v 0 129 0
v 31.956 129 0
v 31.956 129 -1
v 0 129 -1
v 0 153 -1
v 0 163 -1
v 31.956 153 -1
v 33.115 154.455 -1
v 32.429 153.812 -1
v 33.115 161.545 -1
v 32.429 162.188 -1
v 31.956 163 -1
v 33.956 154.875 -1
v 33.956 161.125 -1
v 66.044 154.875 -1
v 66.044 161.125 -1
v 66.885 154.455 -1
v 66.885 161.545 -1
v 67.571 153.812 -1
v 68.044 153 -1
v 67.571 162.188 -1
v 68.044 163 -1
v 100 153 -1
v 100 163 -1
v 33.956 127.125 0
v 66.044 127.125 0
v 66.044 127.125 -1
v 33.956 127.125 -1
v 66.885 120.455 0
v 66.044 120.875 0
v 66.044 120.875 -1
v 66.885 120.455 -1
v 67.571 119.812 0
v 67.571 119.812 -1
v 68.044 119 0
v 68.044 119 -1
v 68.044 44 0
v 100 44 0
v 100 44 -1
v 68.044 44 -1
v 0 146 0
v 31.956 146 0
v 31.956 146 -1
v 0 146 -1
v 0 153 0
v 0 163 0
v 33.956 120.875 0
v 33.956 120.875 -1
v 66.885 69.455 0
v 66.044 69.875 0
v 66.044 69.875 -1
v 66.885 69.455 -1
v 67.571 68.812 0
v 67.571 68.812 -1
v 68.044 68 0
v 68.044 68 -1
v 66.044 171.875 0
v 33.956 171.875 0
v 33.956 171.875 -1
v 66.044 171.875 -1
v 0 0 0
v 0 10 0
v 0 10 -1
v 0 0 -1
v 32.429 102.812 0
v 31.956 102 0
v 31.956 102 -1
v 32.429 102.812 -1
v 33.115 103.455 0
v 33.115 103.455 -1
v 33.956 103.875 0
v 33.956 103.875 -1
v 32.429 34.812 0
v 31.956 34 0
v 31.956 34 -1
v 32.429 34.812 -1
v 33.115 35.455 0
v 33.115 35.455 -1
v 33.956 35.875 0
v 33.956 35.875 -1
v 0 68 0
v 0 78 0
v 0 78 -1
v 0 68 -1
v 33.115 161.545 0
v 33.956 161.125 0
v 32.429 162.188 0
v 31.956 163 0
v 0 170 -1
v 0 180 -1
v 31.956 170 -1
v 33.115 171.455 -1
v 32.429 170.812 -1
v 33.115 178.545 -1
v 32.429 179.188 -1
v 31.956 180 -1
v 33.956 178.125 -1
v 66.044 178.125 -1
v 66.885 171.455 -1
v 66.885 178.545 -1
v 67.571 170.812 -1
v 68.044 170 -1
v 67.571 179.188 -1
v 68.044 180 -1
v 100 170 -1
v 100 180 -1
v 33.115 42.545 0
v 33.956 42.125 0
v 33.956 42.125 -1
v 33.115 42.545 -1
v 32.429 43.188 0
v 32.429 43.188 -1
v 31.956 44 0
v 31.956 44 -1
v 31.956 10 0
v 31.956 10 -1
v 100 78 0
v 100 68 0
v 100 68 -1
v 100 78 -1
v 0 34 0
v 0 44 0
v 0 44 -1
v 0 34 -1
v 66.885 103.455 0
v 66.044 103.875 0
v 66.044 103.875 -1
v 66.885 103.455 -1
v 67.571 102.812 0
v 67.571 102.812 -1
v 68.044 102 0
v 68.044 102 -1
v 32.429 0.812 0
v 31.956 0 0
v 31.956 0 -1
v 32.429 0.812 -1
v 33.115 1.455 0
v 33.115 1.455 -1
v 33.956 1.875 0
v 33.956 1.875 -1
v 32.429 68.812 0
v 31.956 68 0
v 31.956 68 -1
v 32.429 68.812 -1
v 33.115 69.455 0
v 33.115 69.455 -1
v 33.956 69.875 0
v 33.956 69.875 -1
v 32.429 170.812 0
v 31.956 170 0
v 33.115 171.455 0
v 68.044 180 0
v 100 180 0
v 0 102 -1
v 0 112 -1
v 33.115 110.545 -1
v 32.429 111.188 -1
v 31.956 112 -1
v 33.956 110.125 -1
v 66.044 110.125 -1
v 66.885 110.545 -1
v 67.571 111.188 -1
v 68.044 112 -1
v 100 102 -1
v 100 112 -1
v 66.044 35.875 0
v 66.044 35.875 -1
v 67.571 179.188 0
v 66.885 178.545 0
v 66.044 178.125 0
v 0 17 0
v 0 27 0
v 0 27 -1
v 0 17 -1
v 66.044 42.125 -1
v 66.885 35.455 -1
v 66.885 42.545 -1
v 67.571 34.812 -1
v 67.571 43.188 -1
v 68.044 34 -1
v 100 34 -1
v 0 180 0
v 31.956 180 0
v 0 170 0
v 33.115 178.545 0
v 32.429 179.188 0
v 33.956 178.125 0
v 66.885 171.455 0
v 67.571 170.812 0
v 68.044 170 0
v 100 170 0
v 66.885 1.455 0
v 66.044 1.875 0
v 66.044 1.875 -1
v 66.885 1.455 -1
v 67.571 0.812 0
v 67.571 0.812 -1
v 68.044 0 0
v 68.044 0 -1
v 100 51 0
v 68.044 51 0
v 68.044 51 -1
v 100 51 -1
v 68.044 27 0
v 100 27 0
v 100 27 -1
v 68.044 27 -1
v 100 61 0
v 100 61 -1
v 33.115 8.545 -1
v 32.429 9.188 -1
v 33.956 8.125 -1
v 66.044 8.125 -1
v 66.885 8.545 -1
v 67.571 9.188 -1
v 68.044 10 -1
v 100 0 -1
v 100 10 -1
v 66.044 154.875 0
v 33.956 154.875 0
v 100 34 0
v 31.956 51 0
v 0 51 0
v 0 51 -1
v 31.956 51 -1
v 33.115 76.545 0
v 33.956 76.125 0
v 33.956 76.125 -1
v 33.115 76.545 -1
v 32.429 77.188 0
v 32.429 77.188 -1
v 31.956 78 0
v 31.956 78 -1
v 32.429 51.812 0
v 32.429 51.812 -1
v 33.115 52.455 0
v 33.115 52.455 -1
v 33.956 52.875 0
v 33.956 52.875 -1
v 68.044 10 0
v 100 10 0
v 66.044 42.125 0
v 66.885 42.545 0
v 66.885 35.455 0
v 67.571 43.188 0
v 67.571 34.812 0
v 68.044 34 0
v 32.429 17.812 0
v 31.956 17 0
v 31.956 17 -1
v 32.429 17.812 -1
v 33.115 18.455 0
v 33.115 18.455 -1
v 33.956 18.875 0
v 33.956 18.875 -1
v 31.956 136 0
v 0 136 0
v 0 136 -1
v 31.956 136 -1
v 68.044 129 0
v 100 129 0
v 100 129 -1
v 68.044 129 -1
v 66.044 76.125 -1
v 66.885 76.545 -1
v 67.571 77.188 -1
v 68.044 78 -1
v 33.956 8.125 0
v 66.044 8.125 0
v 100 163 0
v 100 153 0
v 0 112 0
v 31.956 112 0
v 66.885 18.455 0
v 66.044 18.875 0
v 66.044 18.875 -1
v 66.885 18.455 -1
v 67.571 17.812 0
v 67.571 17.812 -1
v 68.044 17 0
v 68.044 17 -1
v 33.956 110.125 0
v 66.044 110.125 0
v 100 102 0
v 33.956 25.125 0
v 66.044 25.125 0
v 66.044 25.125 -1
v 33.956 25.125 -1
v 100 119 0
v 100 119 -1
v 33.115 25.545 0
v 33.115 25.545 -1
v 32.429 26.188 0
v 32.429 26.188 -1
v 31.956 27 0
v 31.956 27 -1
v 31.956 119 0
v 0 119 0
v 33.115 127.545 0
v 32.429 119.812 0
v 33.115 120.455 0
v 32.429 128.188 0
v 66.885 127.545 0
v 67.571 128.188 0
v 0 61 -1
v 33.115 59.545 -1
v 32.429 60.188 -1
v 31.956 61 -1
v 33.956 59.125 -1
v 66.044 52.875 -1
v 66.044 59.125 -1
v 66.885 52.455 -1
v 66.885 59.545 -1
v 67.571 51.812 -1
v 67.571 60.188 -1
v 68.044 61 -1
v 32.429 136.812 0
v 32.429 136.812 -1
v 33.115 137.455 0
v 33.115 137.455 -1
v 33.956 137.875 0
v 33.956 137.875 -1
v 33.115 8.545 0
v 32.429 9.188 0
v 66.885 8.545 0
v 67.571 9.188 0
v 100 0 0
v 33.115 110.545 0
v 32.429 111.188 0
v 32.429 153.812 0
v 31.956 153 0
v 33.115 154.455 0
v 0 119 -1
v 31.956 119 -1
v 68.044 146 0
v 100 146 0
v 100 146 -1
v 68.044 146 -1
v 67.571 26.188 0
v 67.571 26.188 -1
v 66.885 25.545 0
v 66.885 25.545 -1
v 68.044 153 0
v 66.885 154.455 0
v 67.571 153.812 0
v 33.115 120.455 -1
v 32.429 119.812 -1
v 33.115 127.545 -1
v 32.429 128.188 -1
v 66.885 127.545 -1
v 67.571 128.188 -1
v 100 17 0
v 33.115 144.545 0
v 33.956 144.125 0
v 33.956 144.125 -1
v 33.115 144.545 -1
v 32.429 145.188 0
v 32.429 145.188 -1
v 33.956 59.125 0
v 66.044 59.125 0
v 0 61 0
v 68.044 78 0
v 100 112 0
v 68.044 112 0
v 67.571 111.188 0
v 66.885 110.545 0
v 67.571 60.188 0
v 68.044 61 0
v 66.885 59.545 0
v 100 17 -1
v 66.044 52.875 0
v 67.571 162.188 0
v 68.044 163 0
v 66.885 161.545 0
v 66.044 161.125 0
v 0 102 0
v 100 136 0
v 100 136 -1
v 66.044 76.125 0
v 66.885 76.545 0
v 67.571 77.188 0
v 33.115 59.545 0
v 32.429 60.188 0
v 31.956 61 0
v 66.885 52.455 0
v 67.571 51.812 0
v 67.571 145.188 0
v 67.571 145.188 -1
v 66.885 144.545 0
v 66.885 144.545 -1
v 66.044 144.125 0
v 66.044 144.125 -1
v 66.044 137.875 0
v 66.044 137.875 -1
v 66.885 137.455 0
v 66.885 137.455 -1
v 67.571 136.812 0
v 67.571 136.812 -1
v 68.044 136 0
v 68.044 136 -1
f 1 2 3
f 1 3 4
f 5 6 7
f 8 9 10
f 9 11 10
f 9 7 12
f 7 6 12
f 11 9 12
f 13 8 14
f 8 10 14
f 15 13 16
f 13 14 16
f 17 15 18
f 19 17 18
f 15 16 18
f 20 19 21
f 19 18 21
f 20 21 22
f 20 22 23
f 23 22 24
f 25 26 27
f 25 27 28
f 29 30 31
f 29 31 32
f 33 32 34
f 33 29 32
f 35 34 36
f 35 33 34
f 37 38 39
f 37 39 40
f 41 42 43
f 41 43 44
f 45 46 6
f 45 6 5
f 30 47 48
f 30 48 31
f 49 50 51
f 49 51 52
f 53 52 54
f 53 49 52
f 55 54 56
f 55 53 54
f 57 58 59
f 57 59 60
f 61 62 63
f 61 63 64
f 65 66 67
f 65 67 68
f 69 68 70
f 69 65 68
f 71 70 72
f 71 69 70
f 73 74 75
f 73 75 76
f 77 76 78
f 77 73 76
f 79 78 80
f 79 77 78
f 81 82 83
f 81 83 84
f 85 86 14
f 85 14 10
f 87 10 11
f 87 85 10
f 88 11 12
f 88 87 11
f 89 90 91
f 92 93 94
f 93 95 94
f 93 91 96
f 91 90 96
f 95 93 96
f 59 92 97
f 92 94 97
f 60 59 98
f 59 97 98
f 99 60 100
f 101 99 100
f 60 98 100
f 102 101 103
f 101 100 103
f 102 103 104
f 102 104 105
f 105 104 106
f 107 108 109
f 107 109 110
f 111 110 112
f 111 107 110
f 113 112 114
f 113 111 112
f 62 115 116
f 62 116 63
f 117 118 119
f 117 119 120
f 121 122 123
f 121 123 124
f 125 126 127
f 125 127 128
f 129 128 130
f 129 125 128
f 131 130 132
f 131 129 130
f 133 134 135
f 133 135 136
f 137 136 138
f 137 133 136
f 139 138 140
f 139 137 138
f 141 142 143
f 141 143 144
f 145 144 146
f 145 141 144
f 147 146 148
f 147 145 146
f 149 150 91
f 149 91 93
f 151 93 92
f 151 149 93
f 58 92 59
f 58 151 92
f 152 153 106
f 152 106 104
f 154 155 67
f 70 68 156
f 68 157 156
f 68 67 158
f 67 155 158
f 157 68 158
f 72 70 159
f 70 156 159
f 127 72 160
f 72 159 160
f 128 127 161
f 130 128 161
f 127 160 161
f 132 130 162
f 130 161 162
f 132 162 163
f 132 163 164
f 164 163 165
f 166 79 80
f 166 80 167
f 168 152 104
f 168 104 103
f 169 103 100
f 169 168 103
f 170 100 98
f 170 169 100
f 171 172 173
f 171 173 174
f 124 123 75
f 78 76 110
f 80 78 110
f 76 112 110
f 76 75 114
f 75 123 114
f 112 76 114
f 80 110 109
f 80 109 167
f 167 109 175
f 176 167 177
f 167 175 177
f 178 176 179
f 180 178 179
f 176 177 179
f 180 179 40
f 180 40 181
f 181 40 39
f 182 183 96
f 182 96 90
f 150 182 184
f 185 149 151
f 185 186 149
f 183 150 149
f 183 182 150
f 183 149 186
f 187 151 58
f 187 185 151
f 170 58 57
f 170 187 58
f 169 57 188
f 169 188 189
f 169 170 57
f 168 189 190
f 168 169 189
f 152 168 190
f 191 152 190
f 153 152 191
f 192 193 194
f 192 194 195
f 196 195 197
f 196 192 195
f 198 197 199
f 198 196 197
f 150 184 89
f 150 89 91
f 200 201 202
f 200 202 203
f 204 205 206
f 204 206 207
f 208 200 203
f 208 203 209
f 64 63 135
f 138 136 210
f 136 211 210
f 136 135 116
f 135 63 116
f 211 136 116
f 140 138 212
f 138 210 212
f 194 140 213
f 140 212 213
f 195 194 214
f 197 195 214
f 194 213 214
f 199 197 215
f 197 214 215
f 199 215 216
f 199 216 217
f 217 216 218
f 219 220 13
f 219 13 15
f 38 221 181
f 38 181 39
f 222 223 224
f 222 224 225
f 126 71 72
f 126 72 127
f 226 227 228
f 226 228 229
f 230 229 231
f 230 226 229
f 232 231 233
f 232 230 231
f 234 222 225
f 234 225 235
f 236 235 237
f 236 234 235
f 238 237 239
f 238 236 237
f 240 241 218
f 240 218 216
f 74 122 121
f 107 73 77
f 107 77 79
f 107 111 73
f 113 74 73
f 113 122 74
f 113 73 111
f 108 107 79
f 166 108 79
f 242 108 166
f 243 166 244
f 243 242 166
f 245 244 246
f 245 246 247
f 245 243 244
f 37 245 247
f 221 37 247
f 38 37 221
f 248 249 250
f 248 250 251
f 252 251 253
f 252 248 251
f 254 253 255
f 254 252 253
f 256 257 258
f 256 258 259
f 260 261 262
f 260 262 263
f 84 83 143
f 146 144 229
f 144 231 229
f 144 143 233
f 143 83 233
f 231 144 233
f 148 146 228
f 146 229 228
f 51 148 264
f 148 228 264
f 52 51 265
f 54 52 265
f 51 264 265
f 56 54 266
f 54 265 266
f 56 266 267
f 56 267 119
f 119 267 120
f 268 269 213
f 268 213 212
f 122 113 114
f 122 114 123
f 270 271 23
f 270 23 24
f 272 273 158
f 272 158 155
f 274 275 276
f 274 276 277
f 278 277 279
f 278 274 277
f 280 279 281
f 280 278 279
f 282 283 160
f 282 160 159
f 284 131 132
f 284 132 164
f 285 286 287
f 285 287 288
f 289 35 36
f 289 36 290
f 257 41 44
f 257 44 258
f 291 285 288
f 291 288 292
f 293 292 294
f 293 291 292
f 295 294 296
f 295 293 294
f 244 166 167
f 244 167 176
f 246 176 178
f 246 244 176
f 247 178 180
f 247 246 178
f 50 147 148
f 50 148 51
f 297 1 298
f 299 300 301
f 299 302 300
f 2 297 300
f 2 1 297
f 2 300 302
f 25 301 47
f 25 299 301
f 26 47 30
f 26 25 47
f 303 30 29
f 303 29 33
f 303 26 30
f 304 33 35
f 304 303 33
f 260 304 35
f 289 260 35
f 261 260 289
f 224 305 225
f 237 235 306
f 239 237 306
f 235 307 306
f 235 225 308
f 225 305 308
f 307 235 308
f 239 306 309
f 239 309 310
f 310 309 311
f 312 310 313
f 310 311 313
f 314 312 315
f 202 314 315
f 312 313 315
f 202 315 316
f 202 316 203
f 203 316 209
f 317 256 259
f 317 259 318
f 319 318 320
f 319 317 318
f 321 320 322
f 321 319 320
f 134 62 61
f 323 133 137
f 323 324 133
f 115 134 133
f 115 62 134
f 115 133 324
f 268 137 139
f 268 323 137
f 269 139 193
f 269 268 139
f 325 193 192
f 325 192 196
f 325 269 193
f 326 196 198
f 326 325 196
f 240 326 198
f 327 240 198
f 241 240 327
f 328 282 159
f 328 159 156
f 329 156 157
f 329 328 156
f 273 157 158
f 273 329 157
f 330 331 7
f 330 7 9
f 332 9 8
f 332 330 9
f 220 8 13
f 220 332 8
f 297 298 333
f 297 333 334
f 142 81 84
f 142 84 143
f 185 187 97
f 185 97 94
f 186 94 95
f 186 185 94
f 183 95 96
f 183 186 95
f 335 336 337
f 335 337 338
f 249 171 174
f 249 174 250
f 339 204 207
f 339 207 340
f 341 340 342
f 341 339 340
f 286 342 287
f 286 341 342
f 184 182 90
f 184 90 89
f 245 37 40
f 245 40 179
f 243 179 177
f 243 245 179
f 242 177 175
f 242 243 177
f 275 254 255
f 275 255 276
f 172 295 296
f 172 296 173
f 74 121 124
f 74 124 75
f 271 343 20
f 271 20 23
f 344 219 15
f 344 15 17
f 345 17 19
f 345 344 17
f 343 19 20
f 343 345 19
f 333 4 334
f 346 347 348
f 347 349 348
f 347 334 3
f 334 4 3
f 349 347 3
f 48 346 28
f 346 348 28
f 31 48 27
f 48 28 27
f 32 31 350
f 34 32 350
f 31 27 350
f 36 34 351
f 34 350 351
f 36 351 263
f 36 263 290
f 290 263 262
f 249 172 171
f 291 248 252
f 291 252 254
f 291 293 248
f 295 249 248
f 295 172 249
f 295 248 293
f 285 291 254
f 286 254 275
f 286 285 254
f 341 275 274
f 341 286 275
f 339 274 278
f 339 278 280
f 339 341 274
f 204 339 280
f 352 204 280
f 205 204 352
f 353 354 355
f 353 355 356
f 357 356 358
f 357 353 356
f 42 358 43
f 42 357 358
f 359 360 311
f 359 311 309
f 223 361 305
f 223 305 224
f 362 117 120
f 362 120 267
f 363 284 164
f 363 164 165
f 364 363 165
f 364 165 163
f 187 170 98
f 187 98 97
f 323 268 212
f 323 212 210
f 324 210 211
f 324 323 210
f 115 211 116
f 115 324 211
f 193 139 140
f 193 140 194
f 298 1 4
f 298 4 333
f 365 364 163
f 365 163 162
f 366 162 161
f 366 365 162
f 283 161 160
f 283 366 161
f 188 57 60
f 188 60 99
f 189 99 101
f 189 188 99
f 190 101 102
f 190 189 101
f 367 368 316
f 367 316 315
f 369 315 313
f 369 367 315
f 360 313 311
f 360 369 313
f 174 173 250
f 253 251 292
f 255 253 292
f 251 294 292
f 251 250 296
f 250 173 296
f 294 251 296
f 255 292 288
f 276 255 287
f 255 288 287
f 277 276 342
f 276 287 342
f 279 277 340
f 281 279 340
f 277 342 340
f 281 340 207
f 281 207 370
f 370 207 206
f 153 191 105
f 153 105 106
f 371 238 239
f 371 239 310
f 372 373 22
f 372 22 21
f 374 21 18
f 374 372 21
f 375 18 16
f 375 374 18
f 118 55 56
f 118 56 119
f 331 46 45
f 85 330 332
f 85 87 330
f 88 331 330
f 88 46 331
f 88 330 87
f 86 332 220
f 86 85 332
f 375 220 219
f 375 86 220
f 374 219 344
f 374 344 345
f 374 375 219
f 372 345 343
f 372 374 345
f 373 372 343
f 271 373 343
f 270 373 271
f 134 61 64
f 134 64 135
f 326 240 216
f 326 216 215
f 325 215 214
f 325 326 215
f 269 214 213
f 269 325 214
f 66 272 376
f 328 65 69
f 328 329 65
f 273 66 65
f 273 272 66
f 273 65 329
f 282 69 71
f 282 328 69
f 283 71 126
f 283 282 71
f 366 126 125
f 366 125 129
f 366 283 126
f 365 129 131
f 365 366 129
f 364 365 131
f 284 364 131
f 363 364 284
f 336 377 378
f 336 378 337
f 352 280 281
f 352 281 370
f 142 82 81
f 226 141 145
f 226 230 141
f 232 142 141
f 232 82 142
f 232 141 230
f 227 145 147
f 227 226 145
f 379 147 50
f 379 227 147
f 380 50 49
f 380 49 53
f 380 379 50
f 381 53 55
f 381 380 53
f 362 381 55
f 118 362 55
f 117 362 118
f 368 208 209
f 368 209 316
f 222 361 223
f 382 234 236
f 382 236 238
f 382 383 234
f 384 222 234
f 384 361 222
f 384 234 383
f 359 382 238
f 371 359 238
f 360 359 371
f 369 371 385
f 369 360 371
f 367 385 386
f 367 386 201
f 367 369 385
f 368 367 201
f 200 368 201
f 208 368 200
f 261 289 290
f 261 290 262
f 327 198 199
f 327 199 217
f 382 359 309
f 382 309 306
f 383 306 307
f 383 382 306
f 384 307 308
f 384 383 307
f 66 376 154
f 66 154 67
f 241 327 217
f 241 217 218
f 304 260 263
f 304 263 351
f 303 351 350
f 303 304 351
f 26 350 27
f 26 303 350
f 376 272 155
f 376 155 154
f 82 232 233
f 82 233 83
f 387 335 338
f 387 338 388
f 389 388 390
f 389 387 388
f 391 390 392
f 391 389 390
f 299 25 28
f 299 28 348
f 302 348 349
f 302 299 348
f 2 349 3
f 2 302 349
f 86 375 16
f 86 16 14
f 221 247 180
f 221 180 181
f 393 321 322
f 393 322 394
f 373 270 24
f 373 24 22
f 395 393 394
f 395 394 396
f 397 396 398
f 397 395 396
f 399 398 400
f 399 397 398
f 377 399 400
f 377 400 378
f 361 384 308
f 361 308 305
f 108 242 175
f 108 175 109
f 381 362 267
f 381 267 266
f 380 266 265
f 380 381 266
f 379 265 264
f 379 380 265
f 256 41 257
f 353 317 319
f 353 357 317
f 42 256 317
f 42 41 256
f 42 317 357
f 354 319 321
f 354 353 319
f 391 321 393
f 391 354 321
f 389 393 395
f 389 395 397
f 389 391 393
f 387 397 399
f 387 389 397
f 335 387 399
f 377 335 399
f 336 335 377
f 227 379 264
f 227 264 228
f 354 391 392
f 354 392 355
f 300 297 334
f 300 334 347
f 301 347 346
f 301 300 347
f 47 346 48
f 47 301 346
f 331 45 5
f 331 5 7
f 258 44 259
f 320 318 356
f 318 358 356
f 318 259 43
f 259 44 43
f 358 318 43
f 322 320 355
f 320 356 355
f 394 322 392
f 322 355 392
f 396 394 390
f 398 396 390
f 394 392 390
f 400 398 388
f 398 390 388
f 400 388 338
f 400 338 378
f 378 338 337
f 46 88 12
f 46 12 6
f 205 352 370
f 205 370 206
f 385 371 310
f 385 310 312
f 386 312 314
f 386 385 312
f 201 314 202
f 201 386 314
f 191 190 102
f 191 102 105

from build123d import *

# Parameters (mm, degrees)
BOSS_EXTRUDE1_DEPTH    = 1
BOSS_EXTRUDE1_2_DEPTH  = 1
BOSS_EXTRUDE1_3_DEPTH  = 1
BOSS_EXTRUDE1_4_DEPTH  = 1
BOSS_EXTRUDE1_5_DEPTH  = 1
BOSS_EXTRUDE1_6_DEPTH  = 1
BOSS_EXTRUDE1_7_DEPTH  = 1
BOSS_EXTRUDE1_8_DEPTH  = 1
BOSS_EXTRUDE1_9_DEPTH  = 1
BOSS_EXTRUDE1_10_DEPTH = 1


with BuildPart() as part:
    # Sketch1 → Boss-Extrude1 (new body)
    with BuildSketch(Plane.XY):
        with BuildLine():
            Line((0, 10), (0, 0))
            Line((0, 0), (31.955983327, 0))
            ThreePointArc((31.955983327, 0), (32.748426731, 1.158893702), (33.955983327, 1.875))
            Line((33.955983327, 1.875), (34, 1.875))
            Line((34, 1.875), (50, 1.875))
            Line((50, 1.875), (66, 1.875))
            Line((66, 1.875), (66.044016673, 1.875))
            ThreePointArc((66.044016673, 1.875), (67.251573269, 1.158893702), (68.044016673, 0))
            Line((68.044016673, 0), (100, 0))
            Line((100, 0), (100, 10))
            Line((100, 10), (68.044016673, 10))
            ThreePointArc((68.044016673, 10), (67.251573269, 8.841106298), (66.044016673, 8.125))
            Line((66.044016673, 8.125), (66, 8.125))
            Line((66, 8.125), (49.955983327, 8.125))
            Line((49.955983327, 8.125), (33.955983327, 8.125))
            ThreePointArc((33.955983327, 8.125), (32.748426731, 8.841106298), (31.955983327, 10))
            Line((31.955983327, 10), (0, 10))
        make_face()
    extrude(amount=-BOSS_EXTRUDE1_DEPTH)


with BuildPart() as body_2:
    # Sketch1 → Boss-Extrude1 2 (new body)
    with BuildSketch(Plane.XY):
        with BuildLine():
            Line((0, 27), (0, 17))
            Line((0, 17), (31.955983327, 17))
            ThreePointArc((31.955983327, 17), (32.748426731, 18.158893702), (33.955983327, 18.875))
            Line((33.955983327, 18.875), (34, 18.875))
            Line((34, 18.875), (50, 18.875))
            Line((50, 18.875), (66, 18.875))
            Line((66, 18.875), (66.044016673, 18.875))
            ThreePointArc((66.044016673, 18.875), (67.251573269, 18.158893702), (68.044016673, 17))
            Line((68.044016673, 17), (100, 17))
            Line((100, 17), (100, 27))
            Line((100, 27), (68.044016673, 27))
            ThreePointArc((68.044016673, 27), (67.251573269, 25.841106298), (66.044016673, 25.125))
            Line((66.044016673, 25.125), (66, 25.125))
            Line((66, 25.125), (49.955983327, 25.125))
            Line((49.955983327, 25.125), (33.955983327, 25.125))
            ThreePointArc((33.955983327, 25.125), (32.748426731, 25.841106298), (31.955983327, 27))
            Line((31.955983327, 27), (0, 27))
        make_face()
    extrude(amount=-BOSS_EXTRUDE1_2_DEPTH)


with BuildPart() as body_3:
    # Sketch1 → Boss-Extrude1 3 (new body)
    with BuildSketch(Plane.XY):
        with BuildLine():
            Line((0, 44), (0, 34))
            Line((0, 34), (31.955983327, 34))
            ThreePointArc((31.955983327, 34), (32.748426731, 35.158893702), (33.955983327, 35.875))
            Line((33.955983327, 35.875), (34, 35.875))
            Line((34, 35.875), (50, 35.875))
            Line((50, 35.875), (66, 35.875))
            Line((66, 35.875), (66.044016673, 35.875))
            ThreePointArc((66.044016673, 35.875), (67.251573269, 35.158893702), (68.044016673, 34))
            Line((68.044016673, 34), (100, 34))
            Line((100, 34), (100, 44))
            Line((100, 44), (68.044016673, 44))
            ThreePointArc((68.044016673, 44), (67.251573269, 42.841106298), (66.044016673, 42.125))
            Line((66.044016673, 42.125), (66, 42.125))
            Line((66, 42.125), (49.955983327, 42.125))
            Line((49.955983327, 42.125), (33.955983327, 42.125))
            ThreePointArc((33.955983327, 42.125), (32.748426731, 42.841106298), (31.955983327, 44))
            Line((31.955983327, 44), (0, 44))
        make_face()
    extrude(amount=-BOSS_EXTRUDE1_3_DEPTH)


with BuildPart() as body_4:
    # Sketch1 → Boss-Extrude1 4 (new body)
    with BuildSketch(Plane.XY):
        with BuildLine():
            Line((0, 61), (0, 51))
            Line((0, 51), (31.955983327, 51))
            ThreePointArc((31.955983327, 51), (32.748426731, 52.158893702), (33.955983327, 52.875))
            Line((33.955983327, 52.875), (34, 52.875))
            Line((34, 52.875), (50, 52.875))
            Line((50, 52.875), (66, 52.875))
            Line((66, 52.875), (66.044016673, 52.875))
            ThreePointArc((66.044016673, 52.875), (67.251573269, 52.158893702), (68.044016673, 51))
            Line((68.044016673, 51), (100, 51))
            Line((100, 51), (100, 61))
            Line((100, 61), (68.044016673, 61))
            ThreePointArc((68.044016673, 61), (67.251573269, 59.841106298), (66.044016673, 59.125))
            Line((66.044016673, 59.125), (66, 59.125))
            Line((66, 59.125), (49.955983327, 59.125))
            Line((49.955983327, 59.125), (33.955983327, 59.125))
            ThreePointArc((33.955983327, 59.125), (32.748426731, 59.841106298), (31.955983327, 61))
            Line((31.955983327, 61), (0, 61))
        make_face()
    extrude(amount=-BOSS_EXTRUDE1_4_DEPTH)


with BuildPart() as body_5:
    # Sketch1 → Boss-Extrude1 5 (new body)
    with BuildSketch(Plane.XY):
        with BuildLine():
            Line((0, 78), (0, 68))
            Line((0, 68), (31.955983327, 68))
            ThreePointArc((31.955983327, 68), (32.748426731, 69.158893702), (33.955983327, 69.875))
            Line((33.955983327, 69.875), (34, 69.875))
            Line((34, 69.875), (50, 69.875))
            Line((50, 69.875), (66, 69.875))
            Line((66, 69.875), (66.044016673, 69.875))
            ThreePointArc((66.044016673, 69.875), (67.251573269, 69.158893702), (68.044016673, 68))
            Line((68.044016673, 68), (100, 68))
            Line((100, 68), (100, 78))
            Line((100, 78), (68.044016673, 78))
            ThreePointArc((68.044016673, 78), (67.251573269, 76.841106298), (66.044016673, 76.125))
            Line((66.044016673, 76.125), (66, 76.125))
            Line((66, 76.125), (49.955983327, 76.125))
            Line((49.955983327, 76.125), (33.955983327, 76.125))
            ThreePointArc((33.955983327, 76.125), (32.748426731, 76.841106298), (31.955983327, 78))
            Line((31.955983327, 78), (0, 78))
        make_face()
    extrude(amount=-BOSS_EXTRUDE1_5_DEPTH)


with BuildPart() as body_6:
    # Sketch1 → Boss-Extrude1 6 (new body)
    with BuildSketch(Plane.XY):
        with BuildLine():
            Line((0, 112), (0, 102))
            Line((0, 102), (31.955983327, 102))
            ThreePointArc((31.955983327, 102), (32.748426731, 103.158893702), (33.955983327, 103.875))
            Line((33.955983327, 103.875), (34, 103.875))
            Line((34, 103.875), (50, 103.875))
            Line((50, 103.875), (66, 103.875))
            Line((66, 103.875), (66.044016673, 103.875))
            ThreePointArc((66.044016673, 103.875), (67.251573269, 103.158893702), (68.044016673, 102))
            Line((68.044016673, 102), (100, 102))
            Line((100, 102), (100, 112))
            Line((100, 112), (68.044016673, 112))
            ThreePointArc((68.044016673, 112), (67.251573269, 110.841106298), (66.044016673, 110.125))
            Line((66.044016673, 110.125), (66, 110.125))
            Line((66, 110.125), (49.955983327, 110.125))
            Line((49.955983327, 110.125), (33.955983327, 110.125))
            ThreePointArc((33.955983327, 110.125), (32.748426731, 110.841106298), (31.955983327, 112))
            Line((31.955983327, 112), (0, 112))
        make_face()
    extrude(amount=-BOSS_EXTRUDE1_6_DEPTH)


with BuildPart() as body_7:
    # Sketch1 → Boss-Extrude1 7 (new body)
    with BuildSketch(Plane.XY):
        with BuildLine():
            Line((0, 129), (0, 119))
            Line((0, 119), (31.955983327, 119))
            ThreePointArc((31.955983327, 119), (32.748426731, 120.158893702), (33.955983327, 120.875))
            Line((33.955983327, 120.875), (34, 120.875))
            Line((34, 120.875), (50, 120.875))
            Line((50, 120.875), (66, 120.875))
            Line((66, 120.875), (66.044016673, 120.875))
            ThreePointArc((66.044016673, 120.875), (67.251573269, 120.158893702), (68.044016673, 119))
            Line((68.044016673, 119), (100, 119))
            Line((100, 119), (100, 129))
            Line((100, 129), (68.044016673, 129))
            ThreePointArc((68.044016673, 129), (67.251573269, 127.841106298), (66.044016673, 127.125))
            Line((66.044016673, 127.125), (66, 127.125))
            Line((66, 127.125), (49.955983327, 127.125))
            Line((49.955983327, 127.125), (33.955983327, 127.125))
            ThreePointArc((33.955983327, 127.125), (32.748426731, 127.841106298), (31.955983327, 129))
            Line((31.955983327, 129), (0, 129))
        make_face()
    extrude(amount=-BOSS_EXTRUDE1_7_DEPTH)


with BuildPart() as body_8:
    # Sketch1 → Boss-Extrude1 8 (new body)
    with BuildSketch(Plane.XY):
        with BuildLine():
            Line((0, 146), (0, 136))
            Line((0, 136), (31.955983327, 136))
            ThreePointArc((31.955983327, 136), (32.748426731, 137.158893702), (33.955983327, 137.875))
            Line((33.955983327, 137.875), (34, 137.875))
            Line((34, 137.875), (50, 137.875))
            Line((50, 137.875), (66, 137.875))
            Line((66, 137.875), (66.044016673, 137.875))
            ThreePointArc((66.044016673, 137.875), (67.251573269, 137.158893702), (68.044016673, 136))
            Line((68.044016673, 136), (100, 136))
            Line((100, 136), (100, 146))
            Line((100, 146), (68.044016673, 146))
            ThreePointArc((68.044016673, 146), (67.251573269, 144.841106298), (66.044016673, 144.125))
            Line((66.044016673, 144.125), (66, 144.125))
            Line((66, 144.125), (49.955983327, 144.125))
            Line((49.955983327, 144.125), (33.955983327, 144.125))
            ThreePointArc((33.955983327, 144.125), (32.748426731, 144.841106298), (31.955983327, 146))
            Line((31.955983327, 146), (0, 146))
        make_face()
    extrude(amount=-BOSS_EXTRUDE1_8_DEPTH)


with BuildPart() as body_9:
    # Sketch1 → Boss-Extrude1 9 (new body)
    with BuildSketch(Plane.XY):
        with BuildLine():
            Line((0, 163), (0, 153))
            Line((0, 153), (31.955983327, 153))
            ThreePointArc((31.955983327, 153), (32.748426731, 154.158893702), (33.955983327, 154.875))
            Line((33.955983327, 154.875), (34, 154.875))
            Line((34, 154.875), (50, 154.875))
            Line((50, 154.875), (66, 154.875))
            Line((66, 154.875), (66.044016673, 154.875))
            ThreePointArc((66.044016673, 154.875), (67.251573269, 154.158893702), (68.044016673, 153))
            Line((68.044016673, 153), (100, 153))
            Line((100, 153), (100, 163))
            Line((100, 163), (68.044016673, 163))
            ThreePointArc((68.044016673, 163), (67.251573269, 161.841106298), (66.044016673, 161.125))
            Line((66.044016673, 161.125), (66, 161.125))
            Line((66, 161.125), (49.955983327, 161.125))
            Line((49.955983327, 161.125), (33.955983327, 161.125))
            ThreePointArc((33.955983327, 161.125), (32.748426731, 161.841106298), (31.955983327, 163))
            Line((31.955983327, 163), (0, 163))
        make_face()
    extrude(amount=-BOSS_EXTRUDE1_9_DEPTH)


with BuildPart() as body_10:
    # Sketch1 → Boss-Extrude1 10 (new body)
    with BuildSketch(Plane.XY):
        with BuildLine():
            Line((0, 180), (0, 170))
            Line((0, 170), (31.955983327, 170))
            ThreePointArc((31.955983327, 170), (32.748426731, 171.158893702), (33.955983327, 171.875))
            Line((33.955983327, 171.875), (34, 171.875))
            Line((34, 171.875), (50, 171.875))
            Line((50, 171.875), (66, 171.875))
            Line((66, 171.875), (66.044016673, 171.875))
            ThreePointArc((66.044016673, 171.875), (67.251573269, 171.158893702), (68.044016673, 170))
            Line((68.044016673, 170), (100, 170))
            Line((100, 170), (100, 180))
            Line((100, 180), (68.044016673, 180))
            ThreePointArc((68.044016673, 180), (67.251573269, 178.841106298), (66.044016673, 178.125))
            Line((66.044016673, 178.125), (66, 178.125))
            Line((66, 178.125), (49.955983327, 178.125))
            Line((49.955983327, 178.125), (33.955983327, 178.125))
            ThreePointArc((33.955983327, 178.125), (32.748426731, 178.841106298), (31.955983327, 180))
            Line((31.955983327, 180), (0, 180))
        make_face()
    extrude(amount=-BOSS_EXTRUDE1_10_DEPTH)


solid = Compound([part.part, body_2.part, body_3.part, body_4.part, body_5.part, body_6.part, body_7.part, body_8.part, body_9.part, body_10.part])
